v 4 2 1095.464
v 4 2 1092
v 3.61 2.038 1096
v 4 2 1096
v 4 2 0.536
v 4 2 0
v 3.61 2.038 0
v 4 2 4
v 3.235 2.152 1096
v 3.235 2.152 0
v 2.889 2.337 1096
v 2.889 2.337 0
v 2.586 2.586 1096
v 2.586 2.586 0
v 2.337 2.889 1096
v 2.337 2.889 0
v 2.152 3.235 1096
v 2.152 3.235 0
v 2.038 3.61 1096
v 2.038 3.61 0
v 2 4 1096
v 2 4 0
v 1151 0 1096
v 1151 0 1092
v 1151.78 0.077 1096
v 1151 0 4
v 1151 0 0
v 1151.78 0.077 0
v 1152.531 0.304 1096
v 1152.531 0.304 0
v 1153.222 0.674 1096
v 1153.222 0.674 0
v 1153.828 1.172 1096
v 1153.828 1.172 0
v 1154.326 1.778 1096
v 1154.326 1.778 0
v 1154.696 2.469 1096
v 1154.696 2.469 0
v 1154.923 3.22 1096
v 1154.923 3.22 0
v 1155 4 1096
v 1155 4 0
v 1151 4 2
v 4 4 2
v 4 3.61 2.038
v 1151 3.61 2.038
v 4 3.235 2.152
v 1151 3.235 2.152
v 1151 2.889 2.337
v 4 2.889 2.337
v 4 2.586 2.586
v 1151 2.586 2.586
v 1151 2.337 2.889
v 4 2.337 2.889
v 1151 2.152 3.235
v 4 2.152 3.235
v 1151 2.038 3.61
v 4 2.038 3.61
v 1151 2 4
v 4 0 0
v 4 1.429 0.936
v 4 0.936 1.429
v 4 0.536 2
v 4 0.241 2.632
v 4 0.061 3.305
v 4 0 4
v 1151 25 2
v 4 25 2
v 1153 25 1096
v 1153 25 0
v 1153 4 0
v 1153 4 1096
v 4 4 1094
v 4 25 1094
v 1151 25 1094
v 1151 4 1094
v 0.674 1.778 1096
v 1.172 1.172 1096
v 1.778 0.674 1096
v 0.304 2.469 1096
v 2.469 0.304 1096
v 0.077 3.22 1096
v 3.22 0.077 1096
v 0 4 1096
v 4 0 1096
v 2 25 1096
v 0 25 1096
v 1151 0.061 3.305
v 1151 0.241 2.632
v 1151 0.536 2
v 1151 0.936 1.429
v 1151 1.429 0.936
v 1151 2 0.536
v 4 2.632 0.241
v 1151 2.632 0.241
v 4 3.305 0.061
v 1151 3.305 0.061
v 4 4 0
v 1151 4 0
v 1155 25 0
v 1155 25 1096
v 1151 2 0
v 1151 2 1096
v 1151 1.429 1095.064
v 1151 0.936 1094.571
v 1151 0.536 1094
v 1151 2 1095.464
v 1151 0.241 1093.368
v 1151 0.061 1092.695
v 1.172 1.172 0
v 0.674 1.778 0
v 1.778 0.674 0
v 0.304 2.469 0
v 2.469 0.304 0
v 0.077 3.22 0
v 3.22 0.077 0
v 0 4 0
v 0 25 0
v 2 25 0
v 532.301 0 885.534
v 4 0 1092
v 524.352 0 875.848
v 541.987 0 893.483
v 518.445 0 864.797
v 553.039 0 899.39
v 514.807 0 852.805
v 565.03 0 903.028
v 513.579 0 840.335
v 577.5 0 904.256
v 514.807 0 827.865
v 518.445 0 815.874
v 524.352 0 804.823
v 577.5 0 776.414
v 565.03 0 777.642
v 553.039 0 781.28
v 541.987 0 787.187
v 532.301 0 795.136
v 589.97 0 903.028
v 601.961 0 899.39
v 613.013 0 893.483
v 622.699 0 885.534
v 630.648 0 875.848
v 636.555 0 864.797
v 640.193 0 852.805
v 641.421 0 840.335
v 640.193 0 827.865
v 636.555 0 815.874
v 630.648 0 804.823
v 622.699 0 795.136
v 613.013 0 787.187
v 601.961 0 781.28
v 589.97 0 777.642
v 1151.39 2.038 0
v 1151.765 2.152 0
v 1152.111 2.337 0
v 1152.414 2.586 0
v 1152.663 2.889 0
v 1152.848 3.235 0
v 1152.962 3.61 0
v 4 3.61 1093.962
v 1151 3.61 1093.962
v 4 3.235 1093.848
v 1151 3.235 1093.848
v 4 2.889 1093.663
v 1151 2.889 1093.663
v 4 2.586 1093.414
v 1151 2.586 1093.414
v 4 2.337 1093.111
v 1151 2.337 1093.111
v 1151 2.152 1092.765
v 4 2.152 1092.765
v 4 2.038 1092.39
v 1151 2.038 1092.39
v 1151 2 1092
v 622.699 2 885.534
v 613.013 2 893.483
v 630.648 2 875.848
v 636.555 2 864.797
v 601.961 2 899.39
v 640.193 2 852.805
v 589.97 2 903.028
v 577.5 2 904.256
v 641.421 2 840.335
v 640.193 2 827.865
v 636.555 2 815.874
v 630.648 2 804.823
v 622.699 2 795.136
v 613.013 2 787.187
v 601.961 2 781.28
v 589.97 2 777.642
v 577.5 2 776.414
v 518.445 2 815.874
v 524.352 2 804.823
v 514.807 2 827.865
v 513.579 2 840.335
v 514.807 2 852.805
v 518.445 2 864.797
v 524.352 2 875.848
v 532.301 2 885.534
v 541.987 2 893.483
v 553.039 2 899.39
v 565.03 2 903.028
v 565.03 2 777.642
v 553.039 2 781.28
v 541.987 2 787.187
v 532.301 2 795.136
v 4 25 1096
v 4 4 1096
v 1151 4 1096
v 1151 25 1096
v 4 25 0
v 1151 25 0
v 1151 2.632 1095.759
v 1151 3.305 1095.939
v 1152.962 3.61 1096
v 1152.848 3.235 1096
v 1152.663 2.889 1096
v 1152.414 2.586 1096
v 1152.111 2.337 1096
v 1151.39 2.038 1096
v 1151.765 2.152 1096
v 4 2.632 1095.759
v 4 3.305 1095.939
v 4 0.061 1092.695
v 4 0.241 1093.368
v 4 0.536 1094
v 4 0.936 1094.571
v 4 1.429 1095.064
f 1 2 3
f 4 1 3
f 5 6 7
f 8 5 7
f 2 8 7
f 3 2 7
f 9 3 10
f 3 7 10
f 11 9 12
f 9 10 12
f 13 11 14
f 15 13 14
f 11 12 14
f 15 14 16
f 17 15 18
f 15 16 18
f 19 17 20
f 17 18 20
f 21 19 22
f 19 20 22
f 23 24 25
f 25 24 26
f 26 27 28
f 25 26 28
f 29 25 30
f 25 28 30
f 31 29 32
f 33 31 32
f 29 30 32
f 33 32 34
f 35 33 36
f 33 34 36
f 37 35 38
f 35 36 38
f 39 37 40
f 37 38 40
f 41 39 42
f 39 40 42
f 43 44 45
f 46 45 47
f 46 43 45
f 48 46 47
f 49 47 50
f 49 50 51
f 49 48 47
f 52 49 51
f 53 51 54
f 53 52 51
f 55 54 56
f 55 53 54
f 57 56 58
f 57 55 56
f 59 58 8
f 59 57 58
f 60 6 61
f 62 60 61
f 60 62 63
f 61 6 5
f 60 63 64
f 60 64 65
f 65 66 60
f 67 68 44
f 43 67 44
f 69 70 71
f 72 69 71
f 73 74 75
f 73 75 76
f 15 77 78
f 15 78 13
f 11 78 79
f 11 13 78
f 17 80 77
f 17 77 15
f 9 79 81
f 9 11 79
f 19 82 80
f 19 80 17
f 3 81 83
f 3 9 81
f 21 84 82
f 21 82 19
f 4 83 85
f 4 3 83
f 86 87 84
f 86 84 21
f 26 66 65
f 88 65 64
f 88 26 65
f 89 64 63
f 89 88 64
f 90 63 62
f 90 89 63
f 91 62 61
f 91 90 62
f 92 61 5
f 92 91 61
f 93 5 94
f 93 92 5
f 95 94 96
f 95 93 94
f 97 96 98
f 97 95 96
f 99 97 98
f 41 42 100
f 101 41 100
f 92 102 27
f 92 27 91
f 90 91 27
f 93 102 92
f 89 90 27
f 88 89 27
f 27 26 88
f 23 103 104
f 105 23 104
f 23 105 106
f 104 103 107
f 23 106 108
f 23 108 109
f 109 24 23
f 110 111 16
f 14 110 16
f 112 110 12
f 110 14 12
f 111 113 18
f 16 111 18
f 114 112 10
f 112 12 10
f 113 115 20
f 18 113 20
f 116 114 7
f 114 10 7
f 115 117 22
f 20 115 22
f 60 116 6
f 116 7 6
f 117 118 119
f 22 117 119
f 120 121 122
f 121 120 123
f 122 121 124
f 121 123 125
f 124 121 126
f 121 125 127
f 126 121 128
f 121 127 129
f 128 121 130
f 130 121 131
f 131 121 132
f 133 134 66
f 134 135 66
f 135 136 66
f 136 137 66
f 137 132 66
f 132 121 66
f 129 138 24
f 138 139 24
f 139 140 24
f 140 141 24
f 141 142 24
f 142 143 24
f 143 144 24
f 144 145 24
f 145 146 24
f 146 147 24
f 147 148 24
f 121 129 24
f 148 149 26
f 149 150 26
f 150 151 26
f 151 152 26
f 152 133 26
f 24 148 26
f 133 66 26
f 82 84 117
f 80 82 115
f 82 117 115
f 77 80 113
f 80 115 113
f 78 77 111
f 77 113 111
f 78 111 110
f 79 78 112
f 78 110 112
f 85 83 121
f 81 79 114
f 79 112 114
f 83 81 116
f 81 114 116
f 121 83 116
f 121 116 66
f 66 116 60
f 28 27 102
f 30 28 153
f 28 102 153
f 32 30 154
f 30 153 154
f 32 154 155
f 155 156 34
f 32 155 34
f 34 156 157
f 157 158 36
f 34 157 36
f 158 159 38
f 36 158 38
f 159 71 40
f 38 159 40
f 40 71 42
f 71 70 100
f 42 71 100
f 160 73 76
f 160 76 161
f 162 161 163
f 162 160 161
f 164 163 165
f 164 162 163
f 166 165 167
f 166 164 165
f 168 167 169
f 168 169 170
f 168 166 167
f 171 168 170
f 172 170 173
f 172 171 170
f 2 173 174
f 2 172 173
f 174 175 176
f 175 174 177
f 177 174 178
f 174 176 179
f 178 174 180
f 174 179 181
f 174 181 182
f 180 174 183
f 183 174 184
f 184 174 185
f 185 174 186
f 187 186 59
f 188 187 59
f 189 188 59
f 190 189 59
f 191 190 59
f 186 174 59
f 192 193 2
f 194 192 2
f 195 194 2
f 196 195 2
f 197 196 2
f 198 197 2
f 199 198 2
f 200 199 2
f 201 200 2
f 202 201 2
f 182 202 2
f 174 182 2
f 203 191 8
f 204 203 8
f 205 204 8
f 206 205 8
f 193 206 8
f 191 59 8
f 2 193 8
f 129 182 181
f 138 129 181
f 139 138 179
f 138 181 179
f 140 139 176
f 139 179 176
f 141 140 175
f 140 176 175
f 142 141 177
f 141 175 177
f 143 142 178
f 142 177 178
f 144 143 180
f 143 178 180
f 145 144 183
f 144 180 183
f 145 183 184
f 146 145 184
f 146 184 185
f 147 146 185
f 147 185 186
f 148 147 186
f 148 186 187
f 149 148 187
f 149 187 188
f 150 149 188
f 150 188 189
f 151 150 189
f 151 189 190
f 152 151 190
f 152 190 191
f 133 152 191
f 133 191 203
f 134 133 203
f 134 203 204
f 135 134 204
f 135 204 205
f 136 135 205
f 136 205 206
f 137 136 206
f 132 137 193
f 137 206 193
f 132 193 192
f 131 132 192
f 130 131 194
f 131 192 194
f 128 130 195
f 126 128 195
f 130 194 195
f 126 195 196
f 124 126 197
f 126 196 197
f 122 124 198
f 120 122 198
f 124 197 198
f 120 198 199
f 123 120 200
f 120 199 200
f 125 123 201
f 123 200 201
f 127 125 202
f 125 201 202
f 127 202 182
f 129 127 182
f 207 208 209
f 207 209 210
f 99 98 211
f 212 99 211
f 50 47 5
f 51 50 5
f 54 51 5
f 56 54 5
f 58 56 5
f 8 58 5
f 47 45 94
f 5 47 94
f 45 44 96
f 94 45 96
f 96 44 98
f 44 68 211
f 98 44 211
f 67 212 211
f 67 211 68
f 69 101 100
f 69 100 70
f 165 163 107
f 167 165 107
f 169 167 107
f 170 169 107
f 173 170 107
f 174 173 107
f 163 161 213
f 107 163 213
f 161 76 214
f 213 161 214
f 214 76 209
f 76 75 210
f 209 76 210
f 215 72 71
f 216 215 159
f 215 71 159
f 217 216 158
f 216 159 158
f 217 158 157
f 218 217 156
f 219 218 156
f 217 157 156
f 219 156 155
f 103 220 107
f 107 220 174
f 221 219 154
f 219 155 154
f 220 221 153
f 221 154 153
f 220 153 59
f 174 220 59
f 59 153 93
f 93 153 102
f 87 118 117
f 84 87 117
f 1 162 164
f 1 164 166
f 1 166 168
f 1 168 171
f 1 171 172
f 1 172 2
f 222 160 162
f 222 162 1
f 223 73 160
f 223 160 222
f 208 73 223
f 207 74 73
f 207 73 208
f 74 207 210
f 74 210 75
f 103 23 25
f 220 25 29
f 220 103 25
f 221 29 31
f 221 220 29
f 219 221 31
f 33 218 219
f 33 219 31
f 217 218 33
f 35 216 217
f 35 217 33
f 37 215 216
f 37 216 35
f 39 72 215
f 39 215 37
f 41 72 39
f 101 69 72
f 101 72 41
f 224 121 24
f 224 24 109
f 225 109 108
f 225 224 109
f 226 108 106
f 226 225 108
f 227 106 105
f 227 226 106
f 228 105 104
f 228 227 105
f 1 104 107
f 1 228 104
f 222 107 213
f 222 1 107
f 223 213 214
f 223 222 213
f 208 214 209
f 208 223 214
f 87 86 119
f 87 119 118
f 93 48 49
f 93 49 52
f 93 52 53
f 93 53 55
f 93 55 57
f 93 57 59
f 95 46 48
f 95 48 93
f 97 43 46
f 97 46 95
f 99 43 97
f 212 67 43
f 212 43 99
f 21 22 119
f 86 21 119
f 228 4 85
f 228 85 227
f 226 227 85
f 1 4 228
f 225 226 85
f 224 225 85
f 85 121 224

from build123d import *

# Parameters (mm, degrees)
BASE_FLANGE1_DEPTH             = 1096
EDGE_FLANGE1_STRIP_W           = 12
EDGE_FLANGE1_STRIP_H           = 2
EDGE_FLANGE1_STRIP_CUT_DEPTH   = 1147
EDGE_FLANGE1_STRIP_2_W         = 12
EDGE_FLANGE1_STRIP_2_H         = 2
EDGE_FLANGE1_STRIP_CUT_2_DEPTH = 1147
EDGE_FLANGE1_DEPTH             = 1147
EDGE_FLANGE1_BEND_DEPTH        = 1147
SKETCH12_R                     = 63.920888045
CUT_EXTRUDE1_DEPTH             = 10


# Sheet-metal steps are written as plain solids
with BuildPart() as part:
    # Sketch1 → Base-Flange1 (new body)
    with BuildSketch(Plane.XY):
        with BuildLine():
            Line((0, 25), (0, 4))
            ThreePointArc((0, 4), (1.171572875, 1.171572875), (4, 0))
            Line((4, 0), (1151, 0))
            ThreePointArc((1151, 0), (1153.828427125, 1.171572875), (1155, 4))
            Line((1155, 4), (1155, 25))
            Line((1155, 25), (1153, 25))
            Line((1153, 25), (1153, 4))
            ThreePointArc((1153, 4), (1152.414213562, 2.585786438), (1151, 2))
            Line((1151, 2), (4, 2))
            ThreePointArc((4, 2), (2.585786438, 2.585786438), (2, 4))
            Line((2, 4), (2, 25))
            Line((2, 25), (0, 25))
        make_face()
    extrude(amount=BASE_FLANGE1_DEPTH)

    # Edge-Flange1 strip (across the edge) → Edge-Flange1 strip cut (cut)
    with BuildSketch(Plane(origin=(4, 2, 1096), x_dir=(0, 0, -1), z_dir=(1, 0, 0))):
        with Locations((-2, -1)):
            Rectangle(EDGE_FLANGE1_STRIP_W, EDGE_FLANGE1_STRIP_H)
    extrude(amount=EDGE_FLANGE1_STRIP_CUT_DEPTH, mode=Mode.SUBTRACT)

    # Edge-Flange1 strip 2 (across the edge) → Edge-Flange1 strip cut 2 (cut)
    with BuildSketch(Plane(origin=(1151, 2, 0), x_dir=(0, 0, 1), z_dir=(-1, 0, 0))):
        with Locations((-2, -1)):
            Rectangle(EDGE_FLANGE1_STRIP_2_W, EDGE_FLANGE1_STRIP_2_H)
    extrude(amount=EDGE_FLANGE1_STRIP_CUT_2_DEPTH, mode=Mode.SUBTRACT)

    # Edge-Flange1 section (across the edge) → Edge-Flange1 (add)
    with BuildSketch(Plane(origin=(4, 2, 1096), x_dir=(0, 0, -1), z_dir=(1, 0, 0))):
        with BuildLine():
            Line((0, 2), (0, 23))
            Line((0, 23), (2, 23))
            Line((2, 23), (2, 2))
            ThreePointArc((2, 2), (2.585786438, 0.585786438), (4, 0))
            Line((4, 0), (4, -2))
            ThreePointArc((4, -2), (1.171572875, -0.828427125), (0, 2))
        make_face()
    extrude(amount=EDGE_FLANGE1_DEPTH)

    # Edge-Flange1 section 2 (across the edge) → Edge-Flange1 bend (add)
    with BuildSketch(Plane(origin=(1151, 2, 0), x_dir=(0, 0, 1), z_dir=(-1, 0, 0))):
        with BuildLine():
            Line((0, 2), (0, 23))
            Line((0, 23), (2, 23))
            Line((2, 23), (2, 2))
            ThreePointArc((2, 2), (2.585786438, 0.585786438), (4, 0))
            Line((4, 0), (4, -2))
            ThreePointArc((4, -2), (1.171572875, -0.828427125), (0, 2))
        make_face()
    extrude(amount=EDGE_FLANGE1_BEND_DEPTH)

    # Sketch12 → Cut-Extrude1 (cut)
    with BuildSketch(Plane(origin=(0, 2, 0), x_dir=(1, 0, 0), z_dir=(0, 1, 0))):
        with Locations(Location((577.5, -840.335133885, 0), (0, 0, 270))):
            Circle(SKETCH12_R)
    extrude(amount=-CUT_EXTRUDE1_DEPTH, mode=Mode.SUBTRACT)


solid = part.part
